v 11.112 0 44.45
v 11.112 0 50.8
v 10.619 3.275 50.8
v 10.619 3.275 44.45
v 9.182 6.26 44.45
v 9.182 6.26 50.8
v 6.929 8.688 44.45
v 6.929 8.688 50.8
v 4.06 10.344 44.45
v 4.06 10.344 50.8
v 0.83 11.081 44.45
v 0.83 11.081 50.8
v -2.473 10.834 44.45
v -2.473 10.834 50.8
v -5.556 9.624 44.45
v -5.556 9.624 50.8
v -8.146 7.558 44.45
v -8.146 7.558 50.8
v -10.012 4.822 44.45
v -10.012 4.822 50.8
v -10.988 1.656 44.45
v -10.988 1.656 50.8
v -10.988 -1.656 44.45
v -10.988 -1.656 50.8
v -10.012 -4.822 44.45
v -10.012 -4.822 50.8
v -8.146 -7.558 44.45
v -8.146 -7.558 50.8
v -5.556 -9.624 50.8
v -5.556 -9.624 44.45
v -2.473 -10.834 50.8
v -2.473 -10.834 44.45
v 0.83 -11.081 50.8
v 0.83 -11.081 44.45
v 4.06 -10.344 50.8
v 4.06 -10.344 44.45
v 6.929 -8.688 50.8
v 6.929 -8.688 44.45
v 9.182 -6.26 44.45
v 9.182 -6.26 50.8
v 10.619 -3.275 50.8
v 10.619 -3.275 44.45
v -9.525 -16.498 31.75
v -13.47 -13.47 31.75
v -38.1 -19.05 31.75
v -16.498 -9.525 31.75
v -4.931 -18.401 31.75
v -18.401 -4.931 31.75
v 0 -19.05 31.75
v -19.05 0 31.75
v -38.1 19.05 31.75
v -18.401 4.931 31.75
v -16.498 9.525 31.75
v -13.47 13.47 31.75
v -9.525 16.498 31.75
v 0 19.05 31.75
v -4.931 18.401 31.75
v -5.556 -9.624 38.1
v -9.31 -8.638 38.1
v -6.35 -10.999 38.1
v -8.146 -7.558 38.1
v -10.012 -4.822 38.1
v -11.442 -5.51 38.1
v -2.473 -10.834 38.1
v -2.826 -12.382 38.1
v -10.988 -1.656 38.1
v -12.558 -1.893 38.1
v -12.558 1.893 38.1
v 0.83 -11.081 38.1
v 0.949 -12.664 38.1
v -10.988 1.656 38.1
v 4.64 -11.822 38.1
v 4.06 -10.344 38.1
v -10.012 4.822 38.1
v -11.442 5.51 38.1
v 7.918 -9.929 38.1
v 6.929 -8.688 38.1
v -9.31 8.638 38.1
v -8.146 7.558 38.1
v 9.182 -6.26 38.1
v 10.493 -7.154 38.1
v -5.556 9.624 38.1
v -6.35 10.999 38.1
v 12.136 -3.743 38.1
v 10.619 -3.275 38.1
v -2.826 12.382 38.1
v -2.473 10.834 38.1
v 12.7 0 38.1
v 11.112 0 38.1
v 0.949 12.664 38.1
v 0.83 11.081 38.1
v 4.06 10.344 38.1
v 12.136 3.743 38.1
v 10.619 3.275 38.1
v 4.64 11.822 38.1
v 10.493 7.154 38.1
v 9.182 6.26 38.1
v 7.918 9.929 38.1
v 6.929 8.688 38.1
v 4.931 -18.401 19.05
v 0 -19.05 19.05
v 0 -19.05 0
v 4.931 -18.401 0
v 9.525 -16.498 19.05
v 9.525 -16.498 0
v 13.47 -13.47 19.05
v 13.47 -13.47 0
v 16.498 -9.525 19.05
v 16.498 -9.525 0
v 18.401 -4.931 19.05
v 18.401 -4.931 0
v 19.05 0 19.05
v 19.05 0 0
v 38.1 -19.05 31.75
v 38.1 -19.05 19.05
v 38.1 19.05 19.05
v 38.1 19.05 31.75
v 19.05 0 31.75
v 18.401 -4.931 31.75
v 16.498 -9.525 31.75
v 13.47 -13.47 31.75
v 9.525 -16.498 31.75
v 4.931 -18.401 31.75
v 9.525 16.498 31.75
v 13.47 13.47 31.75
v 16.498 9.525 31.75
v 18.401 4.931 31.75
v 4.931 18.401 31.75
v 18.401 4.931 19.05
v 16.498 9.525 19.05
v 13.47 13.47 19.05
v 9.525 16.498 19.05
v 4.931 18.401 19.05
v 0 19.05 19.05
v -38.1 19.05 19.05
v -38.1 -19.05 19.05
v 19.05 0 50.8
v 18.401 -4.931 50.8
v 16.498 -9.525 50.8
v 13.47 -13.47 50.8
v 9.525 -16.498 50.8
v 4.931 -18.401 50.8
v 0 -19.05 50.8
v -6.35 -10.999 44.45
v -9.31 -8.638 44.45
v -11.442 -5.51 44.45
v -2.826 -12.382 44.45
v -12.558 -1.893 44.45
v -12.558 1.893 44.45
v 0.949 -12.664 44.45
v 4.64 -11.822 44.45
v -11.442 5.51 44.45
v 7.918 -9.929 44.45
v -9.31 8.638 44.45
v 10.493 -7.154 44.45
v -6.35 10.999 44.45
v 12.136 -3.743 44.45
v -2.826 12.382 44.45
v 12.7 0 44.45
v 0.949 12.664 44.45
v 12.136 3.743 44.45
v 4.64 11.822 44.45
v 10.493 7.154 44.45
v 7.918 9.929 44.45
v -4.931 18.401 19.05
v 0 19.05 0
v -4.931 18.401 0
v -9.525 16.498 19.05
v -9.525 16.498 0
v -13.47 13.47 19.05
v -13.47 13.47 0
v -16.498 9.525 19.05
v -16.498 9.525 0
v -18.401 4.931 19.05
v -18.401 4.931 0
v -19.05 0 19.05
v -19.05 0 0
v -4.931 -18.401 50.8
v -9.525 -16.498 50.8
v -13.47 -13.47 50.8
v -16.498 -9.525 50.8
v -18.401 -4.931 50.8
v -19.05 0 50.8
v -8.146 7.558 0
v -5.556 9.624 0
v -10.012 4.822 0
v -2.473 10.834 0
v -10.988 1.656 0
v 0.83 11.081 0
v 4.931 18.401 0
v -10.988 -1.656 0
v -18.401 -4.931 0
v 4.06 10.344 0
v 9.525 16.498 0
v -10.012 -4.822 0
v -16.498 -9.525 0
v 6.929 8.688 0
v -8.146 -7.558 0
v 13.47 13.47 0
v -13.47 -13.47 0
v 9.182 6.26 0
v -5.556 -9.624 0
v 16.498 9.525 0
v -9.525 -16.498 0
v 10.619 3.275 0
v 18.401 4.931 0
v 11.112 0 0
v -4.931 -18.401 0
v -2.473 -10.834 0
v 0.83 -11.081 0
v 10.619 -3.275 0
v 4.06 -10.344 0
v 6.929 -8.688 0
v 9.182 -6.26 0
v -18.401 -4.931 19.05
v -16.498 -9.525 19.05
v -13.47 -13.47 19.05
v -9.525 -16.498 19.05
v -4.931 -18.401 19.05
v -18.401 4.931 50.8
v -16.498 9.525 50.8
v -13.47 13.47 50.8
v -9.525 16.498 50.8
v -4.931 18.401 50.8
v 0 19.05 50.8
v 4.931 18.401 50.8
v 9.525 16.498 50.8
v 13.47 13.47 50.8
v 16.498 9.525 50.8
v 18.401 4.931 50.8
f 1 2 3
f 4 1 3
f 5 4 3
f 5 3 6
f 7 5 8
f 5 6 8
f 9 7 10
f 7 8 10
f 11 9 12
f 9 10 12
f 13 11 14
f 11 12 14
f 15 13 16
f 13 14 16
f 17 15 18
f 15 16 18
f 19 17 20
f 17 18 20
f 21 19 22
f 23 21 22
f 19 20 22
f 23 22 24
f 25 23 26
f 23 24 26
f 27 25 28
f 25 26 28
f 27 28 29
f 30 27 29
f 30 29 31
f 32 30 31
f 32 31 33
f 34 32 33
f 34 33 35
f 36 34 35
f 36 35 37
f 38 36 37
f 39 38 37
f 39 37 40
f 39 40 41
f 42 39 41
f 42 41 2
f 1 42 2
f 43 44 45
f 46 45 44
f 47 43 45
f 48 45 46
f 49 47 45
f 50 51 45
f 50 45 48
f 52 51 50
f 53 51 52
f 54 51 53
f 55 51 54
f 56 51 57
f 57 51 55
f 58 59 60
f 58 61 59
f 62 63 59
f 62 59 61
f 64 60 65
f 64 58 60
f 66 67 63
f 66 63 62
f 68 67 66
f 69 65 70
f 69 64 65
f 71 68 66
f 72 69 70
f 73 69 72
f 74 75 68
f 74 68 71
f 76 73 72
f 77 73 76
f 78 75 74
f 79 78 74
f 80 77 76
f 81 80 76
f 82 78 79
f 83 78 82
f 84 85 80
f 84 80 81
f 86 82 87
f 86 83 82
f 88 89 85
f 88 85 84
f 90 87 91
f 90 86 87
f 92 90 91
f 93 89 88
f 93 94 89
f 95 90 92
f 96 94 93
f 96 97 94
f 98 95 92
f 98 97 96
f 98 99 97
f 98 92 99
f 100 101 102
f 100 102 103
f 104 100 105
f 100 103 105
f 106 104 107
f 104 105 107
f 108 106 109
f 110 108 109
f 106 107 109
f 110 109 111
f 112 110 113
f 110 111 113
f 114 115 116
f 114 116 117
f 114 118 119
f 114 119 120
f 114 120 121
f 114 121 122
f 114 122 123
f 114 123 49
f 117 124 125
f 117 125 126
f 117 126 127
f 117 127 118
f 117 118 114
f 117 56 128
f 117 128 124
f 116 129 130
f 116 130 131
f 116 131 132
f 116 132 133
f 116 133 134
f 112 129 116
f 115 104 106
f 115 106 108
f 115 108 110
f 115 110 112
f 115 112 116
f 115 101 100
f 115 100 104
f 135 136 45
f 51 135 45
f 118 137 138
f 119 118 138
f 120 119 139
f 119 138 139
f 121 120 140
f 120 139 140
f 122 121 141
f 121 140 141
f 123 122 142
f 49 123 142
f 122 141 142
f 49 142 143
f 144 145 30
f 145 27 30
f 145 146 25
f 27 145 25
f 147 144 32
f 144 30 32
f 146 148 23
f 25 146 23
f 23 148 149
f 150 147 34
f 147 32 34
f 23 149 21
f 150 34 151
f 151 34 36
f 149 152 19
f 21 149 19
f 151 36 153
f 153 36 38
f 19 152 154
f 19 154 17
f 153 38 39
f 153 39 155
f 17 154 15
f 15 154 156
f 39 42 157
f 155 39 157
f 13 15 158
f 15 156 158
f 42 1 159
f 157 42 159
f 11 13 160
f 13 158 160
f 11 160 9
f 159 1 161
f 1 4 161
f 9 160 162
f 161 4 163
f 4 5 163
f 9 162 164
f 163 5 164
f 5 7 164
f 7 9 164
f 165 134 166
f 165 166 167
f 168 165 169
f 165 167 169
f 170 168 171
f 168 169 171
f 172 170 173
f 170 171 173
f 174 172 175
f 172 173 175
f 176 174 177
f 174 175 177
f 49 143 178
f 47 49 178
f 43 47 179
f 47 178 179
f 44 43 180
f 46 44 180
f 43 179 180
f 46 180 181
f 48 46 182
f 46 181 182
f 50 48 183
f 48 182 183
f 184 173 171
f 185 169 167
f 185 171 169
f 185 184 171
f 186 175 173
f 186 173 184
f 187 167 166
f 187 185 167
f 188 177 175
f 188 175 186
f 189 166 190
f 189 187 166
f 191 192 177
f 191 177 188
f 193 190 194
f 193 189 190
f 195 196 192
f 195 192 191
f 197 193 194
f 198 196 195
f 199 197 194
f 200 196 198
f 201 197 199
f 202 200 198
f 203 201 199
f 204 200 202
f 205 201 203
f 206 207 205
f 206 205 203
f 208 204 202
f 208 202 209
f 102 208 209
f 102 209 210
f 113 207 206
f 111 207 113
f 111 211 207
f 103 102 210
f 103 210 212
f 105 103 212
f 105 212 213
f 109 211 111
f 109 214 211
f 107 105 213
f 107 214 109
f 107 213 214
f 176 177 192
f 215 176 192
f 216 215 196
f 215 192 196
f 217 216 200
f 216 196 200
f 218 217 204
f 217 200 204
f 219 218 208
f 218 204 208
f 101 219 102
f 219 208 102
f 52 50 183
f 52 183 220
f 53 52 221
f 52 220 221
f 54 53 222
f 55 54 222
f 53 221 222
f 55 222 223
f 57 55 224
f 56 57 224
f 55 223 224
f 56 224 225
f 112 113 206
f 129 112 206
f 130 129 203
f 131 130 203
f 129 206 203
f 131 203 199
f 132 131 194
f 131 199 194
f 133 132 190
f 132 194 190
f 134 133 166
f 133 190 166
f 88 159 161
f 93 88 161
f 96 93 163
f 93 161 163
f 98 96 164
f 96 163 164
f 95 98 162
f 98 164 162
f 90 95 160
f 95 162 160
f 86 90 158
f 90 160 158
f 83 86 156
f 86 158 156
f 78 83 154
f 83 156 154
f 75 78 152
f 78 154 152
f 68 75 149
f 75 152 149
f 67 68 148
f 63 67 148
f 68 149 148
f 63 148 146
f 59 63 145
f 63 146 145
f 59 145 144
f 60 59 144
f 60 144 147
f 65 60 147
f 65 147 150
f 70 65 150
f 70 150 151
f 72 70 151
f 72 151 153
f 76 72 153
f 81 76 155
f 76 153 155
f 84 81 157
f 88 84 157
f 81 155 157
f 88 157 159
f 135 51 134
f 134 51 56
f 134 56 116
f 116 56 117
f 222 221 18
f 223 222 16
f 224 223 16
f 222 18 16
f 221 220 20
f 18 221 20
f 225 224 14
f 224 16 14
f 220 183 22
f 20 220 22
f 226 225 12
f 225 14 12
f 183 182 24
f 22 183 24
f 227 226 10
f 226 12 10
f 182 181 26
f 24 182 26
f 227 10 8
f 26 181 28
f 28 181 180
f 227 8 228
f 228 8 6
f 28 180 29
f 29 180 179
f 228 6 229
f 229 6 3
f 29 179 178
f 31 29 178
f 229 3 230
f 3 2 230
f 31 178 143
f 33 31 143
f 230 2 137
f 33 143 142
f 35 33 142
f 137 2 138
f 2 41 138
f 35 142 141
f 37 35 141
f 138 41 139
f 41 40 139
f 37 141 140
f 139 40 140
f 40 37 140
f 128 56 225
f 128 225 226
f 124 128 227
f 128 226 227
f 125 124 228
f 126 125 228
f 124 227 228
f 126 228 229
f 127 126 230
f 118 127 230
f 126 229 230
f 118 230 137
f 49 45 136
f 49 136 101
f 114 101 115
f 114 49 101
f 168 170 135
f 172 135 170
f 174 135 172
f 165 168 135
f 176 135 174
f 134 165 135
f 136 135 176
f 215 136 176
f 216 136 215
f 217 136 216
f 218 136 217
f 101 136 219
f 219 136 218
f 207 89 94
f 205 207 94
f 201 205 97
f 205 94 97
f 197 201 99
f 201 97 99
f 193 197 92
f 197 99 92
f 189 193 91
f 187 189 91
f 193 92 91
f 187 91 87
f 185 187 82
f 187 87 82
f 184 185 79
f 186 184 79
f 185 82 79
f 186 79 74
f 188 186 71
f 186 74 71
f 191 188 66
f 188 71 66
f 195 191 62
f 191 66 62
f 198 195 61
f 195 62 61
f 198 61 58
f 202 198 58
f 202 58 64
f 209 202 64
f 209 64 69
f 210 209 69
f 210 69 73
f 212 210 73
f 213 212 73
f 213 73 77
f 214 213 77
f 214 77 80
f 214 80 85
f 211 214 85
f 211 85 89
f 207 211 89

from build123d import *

# Parameters (mm, degrees)
F0_W     = 38.1
F0_H     = 19.05
F0_H_2   = 12.7
F0_W_2   = 19.05
F1_DEPTH = 19.05
F3_DEPTH = 19.05
F5_DEPTH = 19.05
F7_START = -6.35
F6_R     = 12.7
F6_R_2   = 11.1125
F7_DEPTH = 6.35
F8_DEPTH = 50.801


with BuildPart() as f1:
    # F0 (on Front) → F1 (new body, symmetric)
    with BuildSketch(Plane.XZ):
        with Locations((0, 41.275)):
            Rectangle(F0_W, F0_H)
        with Locations((0, 25.4)):
            Rectangle(F0_W, F0_H_2)
        with Locations((0, 9.525)):
            Rectangle(F0_W, F0_H)
        with Locations((-28.575, 25.4)):
            Rectangle(F0_W_2, F0_H_2)
        with Locations((28.575, 25.4)):
            Rectangle(F0_W_2, F0_H_2)
    extrude(amount=F1_DEPTH, both=True)

    # F2 (on face) → F3 (cut)
    with BuildSketch(Plane.XY.offset(50.8)):
        with BuildLine():
            ThreePointArc((-19.05, 0), (-13.4703841816, 13.4703841816), (0, 19.05))
            Line((0, 19.05), (-19.05, 19.05))
            Line((-19.05, 19.05), (-19.05, 0))
        make_face()
        with BuildLine():
            ThreePointArc((0, 19.05), (13.4703841816, 13.4703841816), (19.05, 0))
            Line((19.05, 0), (19.05, 19.05))
            Line((19.05, 19.05), (0, 19.05))
        make_face()
        with BuildLine():
            Line((-19.05, -19.05), (-3.68e-08, -19.05))
            ThreePointArc((-3.68e-08, -19.05), (-13.4703841946, -13.4703841686), (-19.05, 0))
            Line((-19.05, 0), (-19.05, -19.05))
        make_face()
        with BuildLine():
            Line((19.05, -19.05), (19.05, 0))
            ThreePointArc((19.05, 0), (13.4703841686, -13.4703841946), (-3.68e-08, -19.05))
            Line((-3.68e-08, -19.05), (19.05, -19.05))
        make_face()
    extrude(amount=-F3_DEPTH, mode=Mode.SUBTRACT)

    # F4 (on face) → F5 (cut)
    with BuildSketch(Plane(origin=(0, 0, 0), x_dir=(1, 0, 0), z_dir=(0, 0, -1))):
        with BuildLine():
            ThreePointArc((-19.05, -3.68e-08), (-13.4703841946, 13.4703841686), (0, 19.05))
            Line((0, 19.05), (-19.05, 19.05))
            Line((-19.05, 19.05), (-19.05, -3.68e-08))
        make_face()
        with BuildLine():
            ThreePointArc((0, 19.05), (13.4703841816, 13.4703841816), (19.05, 0))
            Line((19.05, 0), (19.05, 19.05))
            Line((19.05, 19.05), (0, 19.05))
        make_face()
        with BuildLine():
            Line((19.05, -19.05), (19.05, 0))
            ThreePointArc((19.05, 0), (13.4703841686, -13.4703841946), (-3.68e-08, -19.05))
            Line((-3.68e-08, -19.05), (19.05, -19.05))
        make_face()
        with BuildLine():
            Line((-19.05, -19.05), (-3.68e-08, -19.05))
            ThreePointArc((-3.68e-08, -19.05), (-13.4703841816, -13.4703841816), (-19.05, -3.68e-08))
            Line((-19.05, -3.68e-08), (-19.05, -19.05))
        make_face()
    extrude(amount=-F5_DEPTH, mode=Mode.SUBTRACT)

    # F6 (on face) → F7 (cut)
    with BuildSketch(Plane.XY.offset(50.8).offset(F7_START)):
        Circle(F6_R)
        Circle(F6_R_2, mode=Mode.SUBTRACT)
    extrude(amount=-F7_DEPTH, mode=Mode.SUBTRACT)

    # F6 (on face) → F8 (cut, through all)
    with BuildSketch(Plane.XY.offset(50.8)):
        Circle(F6_R_2)
    extrude(amount=-F8_DEPTH, mode=Mode.SUBTRACT)


solid = f1.part
